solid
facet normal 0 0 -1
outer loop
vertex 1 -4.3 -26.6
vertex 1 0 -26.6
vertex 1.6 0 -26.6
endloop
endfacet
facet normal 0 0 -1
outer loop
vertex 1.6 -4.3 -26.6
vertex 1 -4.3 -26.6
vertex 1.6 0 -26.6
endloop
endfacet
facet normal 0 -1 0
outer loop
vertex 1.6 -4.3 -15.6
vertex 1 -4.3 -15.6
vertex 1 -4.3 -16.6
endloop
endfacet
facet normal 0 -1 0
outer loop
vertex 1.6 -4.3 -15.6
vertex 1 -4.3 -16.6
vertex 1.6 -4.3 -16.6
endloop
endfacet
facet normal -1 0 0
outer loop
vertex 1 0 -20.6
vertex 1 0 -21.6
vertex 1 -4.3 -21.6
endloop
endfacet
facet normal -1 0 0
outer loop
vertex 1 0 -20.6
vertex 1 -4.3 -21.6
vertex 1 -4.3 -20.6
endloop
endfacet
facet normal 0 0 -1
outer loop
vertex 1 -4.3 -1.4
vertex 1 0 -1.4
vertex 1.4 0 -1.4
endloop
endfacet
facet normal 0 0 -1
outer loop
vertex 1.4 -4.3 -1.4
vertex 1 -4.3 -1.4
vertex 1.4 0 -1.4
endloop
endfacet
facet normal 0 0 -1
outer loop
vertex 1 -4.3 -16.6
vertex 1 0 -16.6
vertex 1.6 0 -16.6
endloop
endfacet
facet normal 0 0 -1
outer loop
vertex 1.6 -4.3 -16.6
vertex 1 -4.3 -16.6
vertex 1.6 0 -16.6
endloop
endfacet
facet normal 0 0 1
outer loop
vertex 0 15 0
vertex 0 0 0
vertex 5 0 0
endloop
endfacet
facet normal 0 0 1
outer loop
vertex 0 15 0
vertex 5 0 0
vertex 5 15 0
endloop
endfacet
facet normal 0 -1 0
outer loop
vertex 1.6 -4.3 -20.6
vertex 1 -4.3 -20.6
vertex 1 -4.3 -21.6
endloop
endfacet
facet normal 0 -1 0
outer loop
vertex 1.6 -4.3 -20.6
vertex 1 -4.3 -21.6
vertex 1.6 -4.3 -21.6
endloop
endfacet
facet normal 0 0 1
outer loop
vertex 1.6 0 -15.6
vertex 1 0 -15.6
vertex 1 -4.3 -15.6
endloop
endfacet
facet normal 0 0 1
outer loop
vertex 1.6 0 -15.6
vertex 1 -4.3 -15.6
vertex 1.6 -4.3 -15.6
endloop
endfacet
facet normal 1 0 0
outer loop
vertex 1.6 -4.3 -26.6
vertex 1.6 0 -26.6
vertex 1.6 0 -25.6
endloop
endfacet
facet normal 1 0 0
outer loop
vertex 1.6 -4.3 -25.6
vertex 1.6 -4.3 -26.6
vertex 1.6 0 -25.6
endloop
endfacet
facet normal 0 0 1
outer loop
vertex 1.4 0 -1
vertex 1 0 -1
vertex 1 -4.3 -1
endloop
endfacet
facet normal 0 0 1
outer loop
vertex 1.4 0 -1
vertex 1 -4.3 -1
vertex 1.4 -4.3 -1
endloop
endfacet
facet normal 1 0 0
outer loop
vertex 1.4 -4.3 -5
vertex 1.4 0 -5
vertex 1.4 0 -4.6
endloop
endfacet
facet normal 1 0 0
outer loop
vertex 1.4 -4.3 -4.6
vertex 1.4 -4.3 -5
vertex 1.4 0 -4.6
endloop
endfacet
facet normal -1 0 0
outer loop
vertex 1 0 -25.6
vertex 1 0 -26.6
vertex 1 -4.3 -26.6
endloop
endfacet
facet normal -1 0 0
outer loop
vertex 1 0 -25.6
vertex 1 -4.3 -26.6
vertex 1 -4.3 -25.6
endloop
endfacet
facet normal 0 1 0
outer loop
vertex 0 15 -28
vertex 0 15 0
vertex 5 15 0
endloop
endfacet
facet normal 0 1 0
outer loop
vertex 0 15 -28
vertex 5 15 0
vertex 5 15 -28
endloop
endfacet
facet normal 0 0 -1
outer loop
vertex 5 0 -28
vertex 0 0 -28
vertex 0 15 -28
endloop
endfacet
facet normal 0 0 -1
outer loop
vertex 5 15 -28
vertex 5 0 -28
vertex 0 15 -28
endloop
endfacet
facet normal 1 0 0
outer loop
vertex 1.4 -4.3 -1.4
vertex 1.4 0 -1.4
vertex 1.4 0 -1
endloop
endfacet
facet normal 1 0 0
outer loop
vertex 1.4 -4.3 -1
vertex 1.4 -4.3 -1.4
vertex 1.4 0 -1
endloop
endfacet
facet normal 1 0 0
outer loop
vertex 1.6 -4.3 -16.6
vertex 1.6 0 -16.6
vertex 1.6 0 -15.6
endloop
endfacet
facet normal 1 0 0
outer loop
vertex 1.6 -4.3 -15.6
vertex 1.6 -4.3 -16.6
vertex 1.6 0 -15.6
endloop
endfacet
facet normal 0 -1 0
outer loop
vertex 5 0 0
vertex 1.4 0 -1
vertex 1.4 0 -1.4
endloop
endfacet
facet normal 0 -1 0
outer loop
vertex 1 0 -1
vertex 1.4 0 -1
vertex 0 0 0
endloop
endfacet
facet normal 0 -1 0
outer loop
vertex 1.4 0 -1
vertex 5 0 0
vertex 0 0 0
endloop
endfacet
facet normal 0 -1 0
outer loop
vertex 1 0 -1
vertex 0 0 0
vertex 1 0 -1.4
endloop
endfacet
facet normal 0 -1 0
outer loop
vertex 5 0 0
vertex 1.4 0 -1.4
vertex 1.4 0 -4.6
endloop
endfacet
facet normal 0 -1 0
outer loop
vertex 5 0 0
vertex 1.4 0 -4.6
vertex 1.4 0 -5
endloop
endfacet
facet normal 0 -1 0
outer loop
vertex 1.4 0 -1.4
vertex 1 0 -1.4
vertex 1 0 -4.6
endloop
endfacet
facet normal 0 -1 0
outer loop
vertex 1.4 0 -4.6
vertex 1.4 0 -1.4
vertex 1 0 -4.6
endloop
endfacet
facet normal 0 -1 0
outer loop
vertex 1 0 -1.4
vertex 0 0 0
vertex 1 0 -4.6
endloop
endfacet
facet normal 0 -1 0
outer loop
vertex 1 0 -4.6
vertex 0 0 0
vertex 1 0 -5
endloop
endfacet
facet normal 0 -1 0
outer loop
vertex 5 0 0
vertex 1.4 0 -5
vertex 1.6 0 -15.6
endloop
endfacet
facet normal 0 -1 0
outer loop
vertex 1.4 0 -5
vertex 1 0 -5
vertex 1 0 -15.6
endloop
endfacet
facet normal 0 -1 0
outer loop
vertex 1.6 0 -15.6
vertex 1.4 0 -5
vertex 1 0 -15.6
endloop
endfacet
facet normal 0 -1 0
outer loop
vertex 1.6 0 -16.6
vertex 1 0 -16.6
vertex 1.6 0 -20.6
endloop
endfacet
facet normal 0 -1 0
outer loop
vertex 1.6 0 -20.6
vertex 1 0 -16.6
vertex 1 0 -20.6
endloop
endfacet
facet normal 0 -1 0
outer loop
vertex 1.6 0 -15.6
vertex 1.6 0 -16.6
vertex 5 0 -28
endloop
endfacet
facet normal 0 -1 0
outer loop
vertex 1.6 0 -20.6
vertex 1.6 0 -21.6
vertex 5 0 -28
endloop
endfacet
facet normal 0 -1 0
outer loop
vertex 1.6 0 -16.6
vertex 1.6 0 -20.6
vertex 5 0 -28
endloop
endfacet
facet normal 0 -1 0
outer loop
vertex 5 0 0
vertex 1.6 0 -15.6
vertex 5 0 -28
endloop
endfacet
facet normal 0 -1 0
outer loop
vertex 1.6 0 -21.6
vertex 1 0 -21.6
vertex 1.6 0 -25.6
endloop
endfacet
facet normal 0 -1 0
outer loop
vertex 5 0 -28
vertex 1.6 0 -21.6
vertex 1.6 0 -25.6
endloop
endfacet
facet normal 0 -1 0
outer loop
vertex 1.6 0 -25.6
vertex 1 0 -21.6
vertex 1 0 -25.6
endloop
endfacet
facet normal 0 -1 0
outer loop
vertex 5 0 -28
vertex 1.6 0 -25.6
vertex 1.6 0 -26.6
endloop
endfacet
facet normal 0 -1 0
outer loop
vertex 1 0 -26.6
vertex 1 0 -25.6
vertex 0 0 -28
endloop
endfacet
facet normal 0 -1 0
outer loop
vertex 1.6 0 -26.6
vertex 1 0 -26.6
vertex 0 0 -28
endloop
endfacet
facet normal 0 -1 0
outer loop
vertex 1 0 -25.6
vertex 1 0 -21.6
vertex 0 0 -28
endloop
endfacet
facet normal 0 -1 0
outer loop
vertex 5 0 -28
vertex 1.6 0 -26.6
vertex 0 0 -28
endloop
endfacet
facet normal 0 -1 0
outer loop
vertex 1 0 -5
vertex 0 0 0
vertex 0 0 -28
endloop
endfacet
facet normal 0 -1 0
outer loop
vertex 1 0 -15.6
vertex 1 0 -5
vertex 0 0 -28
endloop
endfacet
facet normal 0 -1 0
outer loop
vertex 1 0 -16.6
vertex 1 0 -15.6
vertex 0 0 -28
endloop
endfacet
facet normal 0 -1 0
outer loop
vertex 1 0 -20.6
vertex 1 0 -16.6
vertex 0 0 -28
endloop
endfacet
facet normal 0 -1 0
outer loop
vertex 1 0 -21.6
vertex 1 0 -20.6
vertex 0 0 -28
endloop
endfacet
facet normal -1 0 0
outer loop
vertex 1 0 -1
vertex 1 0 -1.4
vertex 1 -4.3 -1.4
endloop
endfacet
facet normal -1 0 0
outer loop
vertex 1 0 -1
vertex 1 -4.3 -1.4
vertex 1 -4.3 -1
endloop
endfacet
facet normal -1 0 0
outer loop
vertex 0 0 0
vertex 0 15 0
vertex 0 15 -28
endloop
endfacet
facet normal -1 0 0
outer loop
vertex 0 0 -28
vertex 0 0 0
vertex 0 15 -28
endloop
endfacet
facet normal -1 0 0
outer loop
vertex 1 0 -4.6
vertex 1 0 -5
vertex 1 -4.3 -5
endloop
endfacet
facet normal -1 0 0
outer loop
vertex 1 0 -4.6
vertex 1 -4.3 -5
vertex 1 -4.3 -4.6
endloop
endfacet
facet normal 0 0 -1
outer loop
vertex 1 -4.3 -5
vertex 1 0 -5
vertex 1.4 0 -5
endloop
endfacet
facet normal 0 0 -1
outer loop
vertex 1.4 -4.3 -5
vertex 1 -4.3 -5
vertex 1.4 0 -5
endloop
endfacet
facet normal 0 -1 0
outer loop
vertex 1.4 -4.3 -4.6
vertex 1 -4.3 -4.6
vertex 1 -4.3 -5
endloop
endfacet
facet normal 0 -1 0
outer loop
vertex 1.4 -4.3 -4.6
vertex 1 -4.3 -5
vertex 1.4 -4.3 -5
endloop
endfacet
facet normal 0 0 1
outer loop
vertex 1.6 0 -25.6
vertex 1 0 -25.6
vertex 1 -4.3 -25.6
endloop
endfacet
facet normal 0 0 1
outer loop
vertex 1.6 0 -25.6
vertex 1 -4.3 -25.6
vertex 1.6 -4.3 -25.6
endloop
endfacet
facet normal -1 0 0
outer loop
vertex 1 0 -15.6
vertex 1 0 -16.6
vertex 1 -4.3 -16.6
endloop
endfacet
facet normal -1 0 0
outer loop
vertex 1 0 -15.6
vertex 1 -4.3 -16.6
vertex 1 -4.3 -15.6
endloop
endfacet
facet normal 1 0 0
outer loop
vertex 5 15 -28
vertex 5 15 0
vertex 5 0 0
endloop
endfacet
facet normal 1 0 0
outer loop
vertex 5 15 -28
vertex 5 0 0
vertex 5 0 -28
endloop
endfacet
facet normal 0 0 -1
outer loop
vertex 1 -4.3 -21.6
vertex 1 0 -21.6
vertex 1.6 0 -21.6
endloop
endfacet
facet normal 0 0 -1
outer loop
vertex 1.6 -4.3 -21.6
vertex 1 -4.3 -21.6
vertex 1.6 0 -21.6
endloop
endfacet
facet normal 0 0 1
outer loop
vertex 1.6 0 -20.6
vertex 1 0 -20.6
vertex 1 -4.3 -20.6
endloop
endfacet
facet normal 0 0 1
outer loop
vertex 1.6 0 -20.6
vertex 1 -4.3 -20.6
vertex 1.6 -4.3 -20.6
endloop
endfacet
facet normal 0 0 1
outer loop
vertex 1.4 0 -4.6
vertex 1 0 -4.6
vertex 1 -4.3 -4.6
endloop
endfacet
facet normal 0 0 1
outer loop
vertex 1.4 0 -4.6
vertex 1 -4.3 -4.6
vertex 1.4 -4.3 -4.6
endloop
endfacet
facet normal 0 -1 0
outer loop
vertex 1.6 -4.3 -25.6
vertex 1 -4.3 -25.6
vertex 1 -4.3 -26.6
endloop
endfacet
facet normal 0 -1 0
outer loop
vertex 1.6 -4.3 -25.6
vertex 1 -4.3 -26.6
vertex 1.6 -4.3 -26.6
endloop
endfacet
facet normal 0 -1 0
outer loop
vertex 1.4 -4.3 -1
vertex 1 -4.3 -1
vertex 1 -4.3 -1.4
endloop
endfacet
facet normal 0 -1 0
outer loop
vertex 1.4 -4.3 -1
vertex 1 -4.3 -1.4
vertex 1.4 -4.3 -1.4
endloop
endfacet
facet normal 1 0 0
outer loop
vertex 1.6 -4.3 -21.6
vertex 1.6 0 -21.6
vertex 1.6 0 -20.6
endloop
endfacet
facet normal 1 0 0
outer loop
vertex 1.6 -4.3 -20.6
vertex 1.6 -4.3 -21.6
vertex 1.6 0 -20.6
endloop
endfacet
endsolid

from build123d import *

# Parameters (mm, degrees)
SKETCH1_W           = 28
SKETCH1_H           = 15
BOSS_EXTRUDE1_DEPTH = 5
SKETCH2_W           = 0.4
SKETCH2_H           = 0.4
SKETCH2_W_2         = 0.6
SKETCH2_H_2         = 1
BOSS_EXTRUDE2_DEPTH = 4.3


with BuildPart() as part:
    # Sketch1 → Boss-Extrude1 (new body)
    with BuildSketch(Plane(origin=(0, 0, 0), x_dir=(0, 0, -1), z_dir=(1, 0, 0))):
        with Locations((14, 7.5)):
            Rectangle(SKETCH1_W, SKETCH1_H)
    extrude(amount=BOSS_EXTRUDE1_DEPTH)

    # Sketch2 → Boss-Extrude2 (add)
    with BuildSketch(Plane.XZ):
        with Locations((1.2, -1.2)):
            Rectangle(SKETCH2_W, SKETCH2_H)
        with Locations((1.2, -4.8)):
            Rectangle(SKETCH2_W, SKETCH2_H)
        with Locations((1.3, -26.1)):
            Rectangle(SKETCH2_W_2, SKETCH2_H_2)
        with Locations((1.3, -21.1)):
            Rectangle(SKETCH2_W_2, SKETCH2_H_2)
        with Locations((1.3, -16.1)):
            Rectangle(SKETCH2_W_2, SKETCH2_H_2)
    extrude(amount=BOSS_EXTRUDE2_DEPTH)


solid = part.part
